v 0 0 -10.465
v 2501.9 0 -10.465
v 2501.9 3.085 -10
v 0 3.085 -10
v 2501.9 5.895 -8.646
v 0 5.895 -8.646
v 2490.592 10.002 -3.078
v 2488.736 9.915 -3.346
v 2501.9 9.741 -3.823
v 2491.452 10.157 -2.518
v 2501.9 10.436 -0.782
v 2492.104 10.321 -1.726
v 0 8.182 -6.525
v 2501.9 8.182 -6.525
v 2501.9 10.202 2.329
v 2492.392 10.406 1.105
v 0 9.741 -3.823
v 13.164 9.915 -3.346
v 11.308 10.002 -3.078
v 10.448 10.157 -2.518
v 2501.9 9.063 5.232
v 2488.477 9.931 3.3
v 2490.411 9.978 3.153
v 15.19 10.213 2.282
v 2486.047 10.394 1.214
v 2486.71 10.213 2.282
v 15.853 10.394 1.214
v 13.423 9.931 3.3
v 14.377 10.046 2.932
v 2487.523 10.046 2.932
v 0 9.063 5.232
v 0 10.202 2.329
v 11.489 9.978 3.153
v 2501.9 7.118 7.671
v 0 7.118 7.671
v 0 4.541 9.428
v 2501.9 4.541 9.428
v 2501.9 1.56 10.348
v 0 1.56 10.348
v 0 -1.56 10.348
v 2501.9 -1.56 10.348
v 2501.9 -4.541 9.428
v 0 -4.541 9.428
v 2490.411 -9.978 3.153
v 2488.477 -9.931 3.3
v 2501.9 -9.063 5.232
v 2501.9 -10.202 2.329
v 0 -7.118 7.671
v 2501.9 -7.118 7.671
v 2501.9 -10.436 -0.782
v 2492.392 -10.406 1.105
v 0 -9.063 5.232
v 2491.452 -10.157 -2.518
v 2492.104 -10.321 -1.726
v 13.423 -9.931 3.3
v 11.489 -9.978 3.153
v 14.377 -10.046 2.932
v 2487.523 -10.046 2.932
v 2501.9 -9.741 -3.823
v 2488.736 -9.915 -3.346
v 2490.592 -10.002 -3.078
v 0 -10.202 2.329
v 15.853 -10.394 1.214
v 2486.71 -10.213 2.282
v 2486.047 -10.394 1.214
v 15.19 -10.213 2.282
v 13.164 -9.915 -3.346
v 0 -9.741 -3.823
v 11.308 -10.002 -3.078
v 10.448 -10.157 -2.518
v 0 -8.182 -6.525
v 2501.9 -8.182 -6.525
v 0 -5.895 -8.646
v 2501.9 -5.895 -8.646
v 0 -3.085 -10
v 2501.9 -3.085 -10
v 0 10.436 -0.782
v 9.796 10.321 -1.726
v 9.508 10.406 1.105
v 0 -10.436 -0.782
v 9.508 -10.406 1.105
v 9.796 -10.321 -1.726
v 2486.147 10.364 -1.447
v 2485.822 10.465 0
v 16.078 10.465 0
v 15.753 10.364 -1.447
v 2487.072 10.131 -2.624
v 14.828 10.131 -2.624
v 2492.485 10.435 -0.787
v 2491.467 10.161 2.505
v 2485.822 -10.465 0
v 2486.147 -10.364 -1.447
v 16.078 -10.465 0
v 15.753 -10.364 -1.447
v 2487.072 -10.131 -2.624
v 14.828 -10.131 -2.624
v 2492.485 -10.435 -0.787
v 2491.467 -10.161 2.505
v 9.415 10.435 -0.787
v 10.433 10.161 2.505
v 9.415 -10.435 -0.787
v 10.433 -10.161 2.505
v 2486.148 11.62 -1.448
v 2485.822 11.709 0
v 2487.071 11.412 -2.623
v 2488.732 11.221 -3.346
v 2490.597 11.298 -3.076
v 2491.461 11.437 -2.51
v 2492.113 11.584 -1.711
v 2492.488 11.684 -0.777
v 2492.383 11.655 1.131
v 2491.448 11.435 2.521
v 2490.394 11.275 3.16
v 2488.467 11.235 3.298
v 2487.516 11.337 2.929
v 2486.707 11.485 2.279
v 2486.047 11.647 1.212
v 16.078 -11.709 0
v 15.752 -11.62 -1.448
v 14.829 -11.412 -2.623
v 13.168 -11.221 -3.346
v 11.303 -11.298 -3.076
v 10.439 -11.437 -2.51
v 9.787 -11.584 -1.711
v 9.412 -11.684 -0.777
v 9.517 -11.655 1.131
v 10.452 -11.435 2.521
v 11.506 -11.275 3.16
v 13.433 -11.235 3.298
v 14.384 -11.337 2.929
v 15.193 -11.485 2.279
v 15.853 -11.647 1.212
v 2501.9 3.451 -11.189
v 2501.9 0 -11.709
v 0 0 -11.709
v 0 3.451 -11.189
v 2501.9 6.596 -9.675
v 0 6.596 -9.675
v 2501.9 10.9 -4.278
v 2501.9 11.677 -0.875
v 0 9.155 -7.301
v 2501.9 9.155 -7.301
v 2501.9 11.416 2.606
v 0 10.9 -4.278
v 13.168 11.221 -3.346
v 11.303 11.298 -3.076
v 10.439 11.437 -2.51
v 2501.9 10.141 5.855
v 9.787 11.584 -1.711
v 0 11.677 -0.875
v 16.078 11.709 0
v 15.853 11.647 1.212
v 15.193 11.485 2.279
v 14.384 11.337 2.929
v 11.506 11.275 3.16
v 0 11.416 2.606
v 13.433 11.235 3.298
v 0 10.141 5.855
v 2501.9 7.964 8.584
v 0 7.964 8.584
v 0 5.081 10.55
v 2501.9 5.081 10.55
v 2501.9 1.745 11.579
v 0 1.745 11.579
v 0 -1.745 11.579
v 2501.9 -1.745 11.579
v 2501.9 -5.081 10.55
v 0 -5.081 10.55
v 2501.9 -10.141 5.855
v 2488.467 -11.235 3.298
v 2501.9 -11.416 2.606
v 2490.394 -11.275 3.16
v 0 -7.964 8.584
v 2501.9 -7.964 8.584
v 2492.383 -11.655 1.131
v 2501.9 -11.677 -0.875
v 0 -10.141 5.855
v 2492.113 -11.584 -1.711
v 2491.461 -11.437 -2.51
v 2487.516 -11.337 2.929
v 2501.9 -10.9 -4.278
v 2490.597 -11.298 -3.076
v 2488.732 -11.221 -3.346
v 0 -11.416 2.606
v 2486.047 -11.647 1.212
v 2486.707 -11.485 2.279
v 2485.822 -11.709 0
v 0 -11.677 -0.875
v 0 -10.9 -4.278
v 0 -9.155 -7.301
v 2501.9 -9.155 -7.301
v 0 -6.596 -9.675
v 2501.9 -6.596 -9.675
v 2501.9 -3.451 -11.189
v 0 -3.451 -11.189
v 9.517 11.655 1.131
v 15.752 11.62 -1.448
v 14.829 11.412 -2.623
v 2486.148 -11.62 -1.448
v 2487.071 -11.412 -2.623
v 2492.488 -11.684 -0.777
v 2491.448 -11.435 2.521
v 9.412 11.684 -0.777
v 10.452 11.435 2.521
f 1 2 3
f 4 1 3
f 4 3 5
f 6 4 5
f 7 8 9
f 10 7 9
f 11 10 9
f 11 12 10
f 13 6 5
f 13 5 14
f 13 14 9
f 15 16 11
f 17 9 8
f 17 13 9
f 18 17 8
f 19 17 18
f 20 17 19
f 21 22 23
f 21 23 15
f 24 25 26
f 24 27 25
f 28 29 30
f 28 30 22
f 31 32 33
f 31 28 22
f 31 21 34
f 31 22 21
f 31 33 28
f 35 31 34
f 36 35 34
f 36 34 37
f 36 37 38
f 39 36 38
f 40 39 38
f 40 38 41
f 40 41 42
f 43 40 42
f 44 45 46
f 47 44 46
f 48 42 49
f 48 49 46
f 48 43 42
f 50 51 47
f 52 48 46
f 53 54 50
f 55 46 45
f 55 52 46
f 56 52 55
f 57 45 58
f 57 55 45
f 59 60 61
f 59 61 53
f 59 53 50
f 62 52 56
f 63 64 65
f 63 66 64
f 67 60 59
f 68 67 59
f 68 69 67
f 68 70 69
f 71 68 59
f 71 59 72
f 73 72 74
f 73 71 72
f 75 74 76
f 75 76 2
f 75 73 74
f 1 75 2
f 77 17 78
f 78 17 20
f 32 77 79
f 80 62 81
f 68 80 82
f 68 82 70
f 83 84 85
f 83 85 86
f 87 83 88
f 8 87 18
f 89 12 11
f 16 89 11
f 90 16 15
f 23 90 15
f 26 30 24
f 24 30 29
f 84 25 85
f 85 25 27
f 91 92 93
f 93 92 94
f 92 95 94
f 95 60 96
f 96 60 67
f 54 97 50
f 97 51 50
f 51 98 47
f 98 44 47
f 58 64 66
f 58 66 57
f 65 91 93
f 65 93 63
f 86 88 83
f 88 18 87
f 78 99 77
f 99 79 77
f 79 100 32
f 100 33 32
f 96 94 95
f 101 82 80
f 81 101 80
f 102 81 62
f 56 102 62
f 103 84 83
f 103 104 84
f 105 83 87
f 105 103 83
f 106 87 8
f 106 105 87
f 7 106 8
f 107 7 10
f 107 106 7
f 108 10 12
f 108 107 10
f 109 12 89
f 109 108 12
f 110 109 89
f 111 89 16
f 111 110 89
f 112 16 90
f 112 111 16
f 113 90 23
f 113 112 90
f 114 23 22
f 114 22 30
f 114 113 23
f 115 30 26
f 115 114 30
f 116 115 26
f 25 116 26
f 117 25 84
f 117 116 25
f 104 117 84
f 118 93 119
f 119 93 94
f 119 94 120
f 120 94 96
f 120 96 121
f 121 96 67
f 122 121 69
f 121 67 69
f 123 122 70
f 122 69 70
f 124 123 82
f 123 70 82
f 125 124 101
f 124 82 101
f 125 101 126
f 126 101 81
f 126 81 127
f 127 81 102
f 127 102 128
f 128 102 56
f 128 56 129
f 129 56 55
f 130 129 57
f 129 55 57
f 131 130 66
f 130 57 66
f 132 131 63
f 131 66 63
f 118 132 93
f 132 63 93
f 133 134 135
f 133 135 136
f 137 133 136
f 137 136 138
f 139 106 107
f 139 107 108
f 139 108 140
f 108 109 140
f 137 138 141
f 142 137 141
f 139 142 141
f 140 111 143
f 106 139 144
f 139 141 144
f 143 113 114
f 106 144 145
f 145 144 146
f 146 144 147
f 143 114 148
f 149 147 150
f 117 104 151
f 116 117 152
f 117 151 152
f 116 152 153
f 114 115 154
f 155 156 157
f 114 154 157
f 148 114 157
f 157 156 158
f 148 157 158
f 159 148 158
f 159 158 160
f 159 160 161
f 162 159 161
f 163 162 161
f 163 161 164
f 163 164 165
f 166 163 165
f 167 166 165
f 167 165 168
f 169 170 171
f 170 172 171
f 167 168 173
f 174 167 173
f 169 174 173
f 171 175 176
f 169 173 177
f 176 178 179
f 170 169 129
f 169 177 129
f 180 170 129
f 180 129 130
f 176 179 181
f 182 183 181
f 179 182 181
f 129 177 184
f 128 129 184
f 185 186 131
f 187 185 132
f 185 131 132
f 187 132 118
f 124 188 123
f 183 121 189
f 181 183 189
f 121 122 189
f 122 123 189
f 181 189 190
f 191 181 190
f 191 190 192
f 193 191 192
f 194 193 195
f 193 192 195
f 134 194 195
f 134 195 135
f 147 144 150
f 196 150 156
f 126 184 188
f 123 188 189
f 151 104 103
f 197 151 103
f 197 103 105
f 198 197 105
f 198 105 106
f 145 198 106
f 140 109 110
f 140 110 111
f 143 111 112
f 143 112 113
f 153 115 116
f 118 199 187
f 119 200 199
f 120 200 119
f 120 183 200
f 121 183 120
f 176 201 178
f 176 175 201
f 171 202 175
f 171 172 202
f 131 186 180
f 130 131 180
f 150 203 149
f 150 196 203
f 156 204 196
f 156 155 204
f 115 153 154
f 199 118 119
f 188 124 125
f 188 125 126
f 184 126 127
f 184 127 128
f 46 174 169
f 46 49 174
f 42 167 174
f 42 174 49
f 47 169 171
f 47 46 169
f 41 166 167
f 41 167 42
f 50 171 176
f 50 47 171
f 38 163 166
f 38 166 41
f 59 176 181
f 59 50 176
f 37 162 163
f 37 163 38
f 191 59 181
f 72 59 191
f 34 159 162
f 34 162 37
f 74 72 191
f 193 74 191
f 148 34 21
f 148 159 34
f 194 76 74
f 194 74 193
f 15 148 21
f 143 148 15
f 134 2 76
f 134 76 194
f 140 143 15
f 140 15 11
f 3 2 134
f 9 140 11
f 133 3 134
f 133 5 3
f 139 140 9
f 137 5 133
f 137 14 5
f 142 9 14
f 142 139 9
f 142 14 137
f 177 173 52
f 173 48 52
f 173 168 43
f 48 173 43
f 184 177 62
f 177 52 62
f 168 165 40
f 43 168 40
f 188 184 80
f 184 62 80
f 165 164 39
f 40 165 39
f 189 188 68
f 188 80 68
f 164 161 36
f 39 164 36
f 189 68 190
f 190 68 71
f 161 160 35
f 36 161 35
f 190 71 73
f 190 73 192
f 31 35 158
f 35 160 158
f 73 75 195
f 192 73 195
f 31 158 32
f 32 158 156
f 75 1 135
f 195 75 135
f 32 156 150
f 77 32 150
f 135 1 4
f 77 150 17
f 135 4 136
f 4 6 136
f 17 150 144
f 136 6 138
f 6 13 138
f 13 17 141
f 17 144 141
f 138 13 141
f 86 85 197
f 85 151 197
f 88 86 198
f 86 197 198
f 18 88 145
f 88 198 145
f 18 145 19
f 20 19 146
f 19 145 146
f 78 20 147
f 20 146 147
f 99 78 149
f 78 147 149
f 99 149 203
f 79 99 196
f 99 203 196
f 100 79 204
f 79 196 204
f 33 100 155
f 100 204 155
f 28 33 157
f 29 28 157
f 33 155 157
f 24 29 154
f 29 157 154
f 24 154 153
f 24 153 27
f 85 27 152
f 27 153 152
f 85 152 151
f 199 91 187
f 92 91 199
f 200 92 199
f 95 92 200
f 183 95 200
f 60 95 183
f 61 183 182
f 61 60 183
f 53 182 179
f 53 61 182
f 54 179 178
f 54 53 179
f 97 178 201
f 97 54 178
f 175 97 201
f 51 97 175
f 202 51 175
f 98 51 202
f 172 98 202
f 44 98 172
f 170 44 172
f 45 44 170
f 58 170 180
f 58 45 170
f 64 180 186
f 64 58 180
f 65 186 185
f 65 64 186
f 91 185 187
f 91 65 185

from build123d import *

# Parameters (mm, degrees)
SKETCH1_R           = 11.7094
SKETCH1_R_2         = 10.4648
BOSS_EXTRUDE1_DEPTH = 2501.9
SKETCH2_R           = 3.3782
CUT_EXTRUDE1_DEPTH  = 12.7094


with BuildPart() as part:
    # Sketch1 → Boss-Extrude1 (new body)
    with BuildSketch(Plane(origin=(0, 0, 0), x_dir=(0, 0, -1), z_dir=(1, 0, 0))):
        Circle(SKETCH1_R)
        Circle(SKETCH1_R_2, mode=Mode.SUBTRACT)
    extrude(amount=BOSS_EXTRUDE1_DEPTH)

    # Sketch2 → Cut-Extrude1 (cut, symmetric)
    with BuildSketch(Plane(origin=(0, 0, 0), x_dir=(1, 0, 0), z_dir=(0, 1, 0))):
        with Locations((12.7, 0)):
            Circle(SKETCH2_R)
    cut_extrude1 = extrude(amount=CUT_EXTRUDE1_DEPTH, both=True, mode=Mode.SUBTRACT)

    # Mirror1: Cut-Extrude1 across plane
    add(cut_extrude1.mirror(Plane.ZY.offset(-1250.95)), mode=Mode.SUBTRACT)


solid = part.part
